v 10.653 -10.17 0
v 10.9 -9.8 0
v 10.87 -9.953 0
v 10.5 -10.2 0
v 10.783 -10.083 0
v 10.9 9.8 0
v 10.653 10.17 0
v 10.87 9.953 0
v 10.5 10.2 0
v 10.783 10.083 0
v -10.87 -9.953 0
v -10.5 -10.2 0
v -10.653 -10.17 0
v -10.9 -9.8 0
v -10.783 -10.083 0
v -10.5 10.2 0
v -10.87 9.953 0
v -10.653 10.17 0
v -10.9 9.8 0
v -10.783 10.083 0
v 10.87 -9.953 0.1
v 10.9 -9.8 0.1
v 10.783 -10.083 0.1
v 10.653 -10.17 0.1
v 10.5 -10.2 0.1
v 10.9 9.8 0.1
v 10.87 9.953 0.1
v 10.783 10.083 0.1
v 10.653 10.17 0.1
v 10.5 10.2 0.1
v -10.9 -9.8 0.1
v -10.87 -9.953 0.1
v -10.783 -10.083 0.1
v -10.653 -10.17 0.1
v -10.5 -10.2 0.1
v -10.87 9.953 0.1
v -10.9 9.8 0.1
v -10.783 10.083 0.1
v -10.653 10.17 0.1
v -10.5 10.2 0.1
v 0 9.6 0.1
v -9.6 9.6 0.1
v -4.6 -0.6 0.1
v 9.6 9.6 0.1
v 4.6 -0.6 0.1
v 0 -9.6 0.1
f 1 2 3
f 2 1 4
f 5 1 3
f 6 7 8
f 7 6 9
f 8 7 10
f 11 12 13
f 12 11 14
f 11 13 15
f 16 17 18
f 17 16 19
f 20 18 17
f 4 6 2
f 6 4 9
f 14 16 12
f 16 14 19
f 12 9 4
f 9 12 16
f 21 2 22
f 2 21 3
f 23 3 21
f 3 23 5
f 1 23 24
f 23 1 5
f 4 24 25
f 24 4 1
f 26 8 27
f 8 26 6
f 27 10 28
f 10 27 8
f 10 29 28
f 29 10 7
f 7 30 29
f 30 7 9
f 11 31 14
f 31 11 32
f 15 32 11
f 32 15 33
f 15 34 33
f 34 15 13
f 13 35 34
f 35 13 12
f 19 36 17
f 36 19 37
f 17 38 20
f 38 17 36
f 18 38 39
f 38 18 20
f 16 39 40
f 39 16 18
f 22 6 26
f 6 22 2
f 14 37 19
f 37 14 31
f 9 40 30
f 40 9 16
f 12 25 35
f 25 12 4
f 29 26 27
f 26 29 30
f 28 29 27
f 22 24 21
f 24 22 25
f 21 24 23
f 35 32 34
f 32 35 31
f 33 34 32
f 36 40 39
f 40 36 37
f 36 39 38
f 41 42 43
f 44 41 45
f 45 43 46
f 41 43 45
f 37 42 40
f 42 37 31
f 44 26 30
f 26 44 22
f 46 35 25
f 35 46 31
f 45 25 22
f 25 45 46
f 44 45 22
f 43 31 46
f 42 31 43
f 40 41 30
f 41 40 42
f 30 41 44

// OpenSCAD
// file: ../p/1-4cyli.scad
use <../lib.scad>
function ldraw_lib__1_4cyli() = [
// 0 Cylinder 0.25
// 0 Name: 1-4cyli.dat
// 0 Author: James Jessiman
// 0 !LDRAW_ORG Primitive UPDATE 2012-01
// 0 !LICENSE Licensed under CC BY 4.0 : see CAreadme.txt
// 
// 0 BFC CERTIFY CCW
  [0,"BFC","CERTIFY"],
  [0,"BFC","CCW"],
// 
// 0 !HISTORY 2002-03-23 [sbliss] Added BFC statement.
// 0 !HISTORY 2002-04-25 [PTadmin] Official Update 2002-02
// 0 !HISTORY 2007-06-22 [PTadmin] Header formatted for Contributor Agreement
// 0 !HISTORY 2008-07-01 [PTadmin] Official Update 2008-01
// 0 !HISTORY 2012-02-16 [Philo] Changed to CCW
// 0 !HISTORY 2012-03-30 [PTadmin] Official Update 2012-01
// 
// 
// 4 16 1 1 0 0.9239 1 0.3827 0.9239 0 0.3827 1 0 0
  [4,16,1,1,0,0.9239,1,0.3827,0.9239,0,0.3827,1,0,0],
// 5 24 1 0 0 1 1 0 0.9239 0 0.3827 1 0 -1
  [5,24,1,0,0,1,1,0,0.9239,0,0.3827,1,0,-1],
// 4 16 0.9239 1 0.3827 0.7071 1 0.7071 0.7071 0 0.7071 0.9239 0 0.3827
  [4,16,0.9239,1,0.3827,0.7071,1,0.7071,0.7071,0,0.7071,0.9239,0,0.3827],
// 5 24 0.9239 0 0.3827 0.9239 1 0.3827 0.7071 0 0.7071 1 0 0
  [5,24,0.9239,0,0.3827,0.9239,1,0.3827,0.7071,0,0.7071,1,0,0],
// 4 16 0.7071 1 0.7071 0.3827 1 0.9239 0.3827 0 0.9239 0.7071 0 0.7071
  [4,16,0.7071,1,0.7071,0.3827,1,0.9239,0.3827,0,0.9239,0.7071,0,0.7071],
// 5 24 0.7071 0 0.7071 0.7071 1 0.7071 0.3827 0 0.9239 0.9239 0 0.3827
  [5,24,0.7071,0,0.7071,0.7071,1,0.7071,0.3827,0,0.9239,0.9239,0,0.3827],
// 4 16 0.3827 1 0.9239 0 1 1 0 0 1 0.3827 0 0.9239
  [4,16,0.3827,1,0.9239,0,1,1,0,0,1,0.3827,0,0.9239],
// 5 24 0.3827 0 0.9239 0.3827 1 0.9239 0 0 1 0.7071 0 0.7071
  [5,24,0.3827,0,0.9239,0.3827,1,0.9239,0,0,1,0.7071,0,0.7071],
// 5 24 0 0 1 0 1 1 0.3827 0 0.9239 -1 0 1
  [5,24,0,0,1,0,1,1,0.3827,0,0.9239,-1,0,1],
];
module ldraw_lib__1_4cyli(step=0, col=false, unit=2/5, alt=false, line=0.2, solid=!$preview)
    makepoly(ldraw_lib__1_4cyli(), step=step, col=col, unit=unit, alt=alt, line=line, solid=solid);
ldraw_lib__1_4cyli(line=0.2);
// file: ../p/1-4chrd.scad
use <../lib.scad>
function ldraw_lib__1_4chrd() = [
// 0 Chord 0.25
// 0 Name: 1-4chrd.dat
// 0 Author: Max Martin Richter [MMR1988]
// 0 !LDRAW_ORG Primitive UPDATE 2023-05
// 0 !LICENSE Licensed under CC BY 4.0 : see CAreadme.txt
// 
// 0 BFC CERTIFY CCW
  [0,"BFC","CERTIFY"],
  [0,"BFC","CCW"],
// 
// 0 !HISTORY 2004-04-22 [PTadmin] Official Update 2004-02
// 0 !HISTORY 2007-10-09 [PTadmin] Header formatted for Contributor Agreement
// 0 !HISTORY 2008-07-01 [PTadmin] Official Update 2008-01
// 0 !HISTORY 2012-08-02 [MMR1988] Re-creation with PrimGen2 and Rectifier
// 0 !HISTORY 2012-08-09 [PTadmin] Official Update 2012-02
// 0 !HISTORY 2023-10-27 [OrionP] Change author to MMR1988 from hafhead
// 0 !HISTORY 2023-10-31 [OrionP] Official Update 2023-05
// 
// 4 16 0.9239 0 0.3827 0.3827 0 0.9239 0 0 1 1 0 0
  [4,16,0.9239,0,0.3827,0.3827,0,0.9239,0,0,1,1,0,0],
// 3 16 0.7071 0 0.7071 0.3827 0 0.9239 0.9239 0 0.3827
  [3,16,0.7071,0,0.7071,0.3827,0,0.9239,0.9239,0,0.3827],
];
module ldraw_lib__1_4chrd(step=0, col=false, unit=2/5, alt=false, line=0.2, solid=!$preview)
    makepoly(ldraw_lib__1_4chrd(), step=step, col=col, unit=unit, alt=alt, line=line, solid=solid);
ldraw_lib__1_4chrd(line=0.2);
// main file
use <../lib.scad>
use <../p/1-4chrd.scad>
use <../p/1-4cyli.scad>
function ldraw_lib__6429457a() = [
// 0 Sticker  2.6 x  2.7 with Blacktron I Logo
// 0 Name: 6429457a.dat
// 0 Author: Gabriel Läufer [Dr.Bricktacular]
// 0 !LDRAW_ORG Part UPDATE 2025-02
// 0 !LICENSE Licensed under CC BY 4.0 : see CAreadme.txt
// 
// 0 BFC CERTIFY CCW
  [0,"BFC","CERTIFY"],
  [0,"BFC","CCW"],
// 
// 0 !KEYWORDS Blacktron Cruiser, Bricklink 40580stk01, Brickowl 402277
// 0 !KEYWORDS Rebrickable 10102362, Set 40580
// 
// 0 !HISTORY 2025-02-27 [OrionP] Official Update 2025-02
// 
// 0 // Sticker-Bottom
// 1 16 26.25 0 -24.5 1 0 0 0 -1 0 0 0 -1 1-4chrd.dat
  [1,16,26.25,0,-24.5,1,0,0,0,-1,0,0,0,-1, ldraw_lib__1_4chrd()],
// 1 16 26.25 0 24.5 1 0 0 0 -1 0 0 0 1 1-4chrd.dat
  [1,16,26.25,0,24.5,1,0,0,0,-1,0,0,0,1, ldraw_lib__1_4chrd()],
// 1 16 -26.25 0 -24.5 -1 0 0 0 -1 0 0 0 -1 1-4chrd.dat
  [1,16,-26.25,0,-24.5,-1,0,0,0,-1,0,0,0,-1, ldraw_lib__1_4chrd()],
// 1 16 -26.25 0 24.5 -1 0 0 0 -1 0 0 0 1 1-4chrd.dat
  [1,16,-26.25,0,24.5,-1,0,0,0,-1,0,0,0,1, ldraw_lib__1_4chrd()],
// 4 16 27.25 0 24.5 27.25 0 -24.5 26.25 0 -25.5 26.25 0 25.5
  [4,16,27.25,0,24.5,27.25,0,-24.5,26.25,0,-25.5,26.25,0,25.5],
// 4 16 -27.25 0 24.5 -26.25 0 25.5 -26.25 0 -25.5 -27.25 0 -24.5
  [4,16,-27.25,0,24.5,-26.25,0,25.5,-26.25,0,-25.5,-27.25,0,-24.5],
// 4 16 26.25 0 25.5 26.25 0 -25.5 -26.25 0 -25.5 -26.25 0 25.5
  [4,16,26.25,0,25.5,26.25,0,-25.5,-26.25,0,-25.5,-26.25,0,25.5],
// 
// 0 // Sticker-Side
// 1 16 26.25 -0.25 -24.5 1 0 0 0 0.25 0 0 0 -1 1-4cyli.dat
  [1,16,26.25,-0.25,-24.5,1,0,0,0,0.25,0,0,0,-1, ldraw_lib__1_4cyli()],
// 1 16 26.25 -0.25 24.5 1 0 0 0 0.25 0 0 0 1 1-4cyli.dat
  [1,16,26.25,-0.25,24.5,1,0,0,0,0.25,0,0,0,1, ldraw_lib__1_4cyli()],
// 1 16 -26.25 -0.25 -24.5 -1 0 0 0 0.25 0 0 0 -1 1-4cyli.dat
  [1,16,-26.25,-0.25,-24.5,-1,0,0,0,0.25,0,0,0,-1, ldraw_lib__1_4cyli()],
// 1 16 -26.25 -0.25 24.5 -1 0 0 0 0.25 0 0 0 1 1-4cyli.dat
  [1,16,-26.25,-0.25,24.5,-1,0,0,0,0.25,0,0,0,1, ldraw_lib__1_4cyli()],
// 4 16 27.25 0 24.5 27.25 -0.25 24.5 27.25 -0.25 -24.5 27.25 0 -24.5
  [4,16,27.25,0,24.5,27.25,-0.25,24.5,27.25,-0.25,-24.5,27.25,0,-24.5],
// 4 16 -27.25 0 24.5 -27.25 0 -24.5 -27.25 -0.25 -24.5 -27.25 -0.25 24.5
  [4,16,-27.25,0,24.5,-27.25,0,-24.5,-27.25,-0.25,-24.5,-27.25,-0.25,24.5],
// 4 16 -26.25 0 25.5 -26.25 -0.25 25.5 26.25 -0.25 25.5 26.25 0 25.5
  [4,16,-26.25,0,25.5,-26.25,-0.25,25.5,26.25,-0.25,25.5,26.25,0,25.5],
// 4 16 -26.25 0 -25.5 26.25 0 -25.5 26.25 -0.25 -25.5 -26.25 -0.25 -25.5
  [4,16,-26.25,0,-25.5,26.25,0,-25.5,26.25,-0.25,-25.5,-26.25,-0.25,-25.5],
// 
// 0 // Sticker-Front
// 1 0 26.25 -0.25 24.5 1 0 0 0 1 0 0 0 1 1-4chrd.dat
  [1,0,26.25,-0.25,24.5,1,0,0,0,1,0,0,0,1, ldraw_lib__1_4chrd()],
// 1 0 26.25 -0.25 -24.5 1 0 0 0 1 0 0 0 -1 1-4chrd.dat
  [1,0,26.25,-0.25,-24.5,1,0,0,0,1,0,0,0,-1, ldraw_lib__1_4chrd()],
// 1 0 -26.25 -0.25 -24.5 -1 0 0 0 1 0 0 0 -1 1-4chrd.dat
  [1,0,-26.25,-0.25,-24.5,-1,0,0,0,1,0,0,0,-1, ldraw_lib__1_4chrd()],
// 1 0 -26.25 -0.25 24.5 -1 0 0 0 1 0 0 0 1 1-4chrd.dat
  [1,0,-26.25,-0.25,24.5,-1,0,0,0,1,0,0,0,1, ldraw_lib__1_4chrd()],
// 3 14 0 -0.25 24 -24 -0.25 24 -11.5 -0.25 -1.5
  [3,14,0,-0.25,24,-24,-0.25,24,-11.5,-0.25,-1.5],
// 3 14 24 -0.25 24 0 -0.25 24 11.5 -0.25 -1.5
  [3,14,24,-0.25,24,0,-0.25,24,11.5,-0.25,-1.5],
// 3 14 11.5 -0.25 -1.5 -11.5 -0.25 -1.5 0 -0.25 -24
  [3,14,11.5,-0.25,-1.5,-11.5,-0.25,-1.5,0,-0.25,-24],
// 3 0 0 -0.25 24 -11.5 -0.25 -1.5 11.5 -0.25 -1.5
  [3,0,0,-0.25,24,-11.5,-0.25,-1.5,11.5,-0.25,-1.5],
// 4 0 -24 -0.25 24 -26.25 -0.25 25.5 -27.25 -0.25 24.5 -27.25 -0.25 -24.5
  [4,0,-24,-0.25,24,-26.25,-0.25,25.5,-27.25,-0.25,24.5,-27.25,-0.25,-24.5],
// 4 0 27.25 -0.25 24.5 26.25 -0.25 25.5 24 -0.25 24 27.25 -0.25 -24.5
  [4,0,27.25,-0.25,24.5,26.25,-0.25,25.5,24,-0.25,24,27.25,-0.25,-24.5],
// 4 0 0 -0.25 -24 -27.25 -0.25 -24.5 -26.25 -0.25 -25.5 26.25 -0.25 -25.5
  [4,0,0,-0.25,-24,-27.25,-0.25,-24.5,-26.25,-0.25,-25.5,26.25,-0.25,-25.5],
// 4 0 0 -0.25 -24 26.25 -0.25 -25.5 27.25 -0.25 -24.5 11.5 -0.25 -1.5
  [4,0,0,-0.25,-24,26.25,-0.25,-25.5,27.25,-0.25,-24.5,11.5,-0.25,-1.5],
// 3 0 24 -0.25 24 11.5 -0.25 -1.5 27.25 -0.25 -24.5
  [3,0,24,-0.25,24,11.5,-0.25,-1.5,27.25,-0.25,-24.5],
// 3 0 -11.5 -0.25 -1.5 -27.25 -0.25 -24.5 0 -0.25 -24
  [3,0,-11.5,-0.25,-1.5,-27.25,-0.25,-24.5,0,-0.25,-24],
// 3 0 -24 -0.25 24 -27.25 -0.25 -24.5 -11.5 -0.25 -1.5
  [3,0,-24,-0.25,24,-27.25,-0.25,-24.5,-11.5,-0.25,-1.5],
// 4 0 -26.25 -0.25 25.5 -24 -0.25 24 0 -0.25 24 26.25 -0.25 25.5
  [4,0,-26.25,-0.25,25.5,-24,-0.25,24,0,-0.25,24,26.25,-0.25,25.5],
// 3 0 26.25 -0.25 25.5 0 -0.25 24 24 -0.25 24
  [3,0,26.25,-0.25,25.5,0,-0.25,24,24,-0.25,24],
];
module ldraw_lib__6429457a(step=0, col=false, unit=2/5, alt=false, line=0.2, solid=!$preview)
    makepoly(ldraw_lib__6429457a(), step=step, col=col, unit=unit, alt=alt, line=line, solid=solid);
ldraw_lib__6429457a(line=0.2);
